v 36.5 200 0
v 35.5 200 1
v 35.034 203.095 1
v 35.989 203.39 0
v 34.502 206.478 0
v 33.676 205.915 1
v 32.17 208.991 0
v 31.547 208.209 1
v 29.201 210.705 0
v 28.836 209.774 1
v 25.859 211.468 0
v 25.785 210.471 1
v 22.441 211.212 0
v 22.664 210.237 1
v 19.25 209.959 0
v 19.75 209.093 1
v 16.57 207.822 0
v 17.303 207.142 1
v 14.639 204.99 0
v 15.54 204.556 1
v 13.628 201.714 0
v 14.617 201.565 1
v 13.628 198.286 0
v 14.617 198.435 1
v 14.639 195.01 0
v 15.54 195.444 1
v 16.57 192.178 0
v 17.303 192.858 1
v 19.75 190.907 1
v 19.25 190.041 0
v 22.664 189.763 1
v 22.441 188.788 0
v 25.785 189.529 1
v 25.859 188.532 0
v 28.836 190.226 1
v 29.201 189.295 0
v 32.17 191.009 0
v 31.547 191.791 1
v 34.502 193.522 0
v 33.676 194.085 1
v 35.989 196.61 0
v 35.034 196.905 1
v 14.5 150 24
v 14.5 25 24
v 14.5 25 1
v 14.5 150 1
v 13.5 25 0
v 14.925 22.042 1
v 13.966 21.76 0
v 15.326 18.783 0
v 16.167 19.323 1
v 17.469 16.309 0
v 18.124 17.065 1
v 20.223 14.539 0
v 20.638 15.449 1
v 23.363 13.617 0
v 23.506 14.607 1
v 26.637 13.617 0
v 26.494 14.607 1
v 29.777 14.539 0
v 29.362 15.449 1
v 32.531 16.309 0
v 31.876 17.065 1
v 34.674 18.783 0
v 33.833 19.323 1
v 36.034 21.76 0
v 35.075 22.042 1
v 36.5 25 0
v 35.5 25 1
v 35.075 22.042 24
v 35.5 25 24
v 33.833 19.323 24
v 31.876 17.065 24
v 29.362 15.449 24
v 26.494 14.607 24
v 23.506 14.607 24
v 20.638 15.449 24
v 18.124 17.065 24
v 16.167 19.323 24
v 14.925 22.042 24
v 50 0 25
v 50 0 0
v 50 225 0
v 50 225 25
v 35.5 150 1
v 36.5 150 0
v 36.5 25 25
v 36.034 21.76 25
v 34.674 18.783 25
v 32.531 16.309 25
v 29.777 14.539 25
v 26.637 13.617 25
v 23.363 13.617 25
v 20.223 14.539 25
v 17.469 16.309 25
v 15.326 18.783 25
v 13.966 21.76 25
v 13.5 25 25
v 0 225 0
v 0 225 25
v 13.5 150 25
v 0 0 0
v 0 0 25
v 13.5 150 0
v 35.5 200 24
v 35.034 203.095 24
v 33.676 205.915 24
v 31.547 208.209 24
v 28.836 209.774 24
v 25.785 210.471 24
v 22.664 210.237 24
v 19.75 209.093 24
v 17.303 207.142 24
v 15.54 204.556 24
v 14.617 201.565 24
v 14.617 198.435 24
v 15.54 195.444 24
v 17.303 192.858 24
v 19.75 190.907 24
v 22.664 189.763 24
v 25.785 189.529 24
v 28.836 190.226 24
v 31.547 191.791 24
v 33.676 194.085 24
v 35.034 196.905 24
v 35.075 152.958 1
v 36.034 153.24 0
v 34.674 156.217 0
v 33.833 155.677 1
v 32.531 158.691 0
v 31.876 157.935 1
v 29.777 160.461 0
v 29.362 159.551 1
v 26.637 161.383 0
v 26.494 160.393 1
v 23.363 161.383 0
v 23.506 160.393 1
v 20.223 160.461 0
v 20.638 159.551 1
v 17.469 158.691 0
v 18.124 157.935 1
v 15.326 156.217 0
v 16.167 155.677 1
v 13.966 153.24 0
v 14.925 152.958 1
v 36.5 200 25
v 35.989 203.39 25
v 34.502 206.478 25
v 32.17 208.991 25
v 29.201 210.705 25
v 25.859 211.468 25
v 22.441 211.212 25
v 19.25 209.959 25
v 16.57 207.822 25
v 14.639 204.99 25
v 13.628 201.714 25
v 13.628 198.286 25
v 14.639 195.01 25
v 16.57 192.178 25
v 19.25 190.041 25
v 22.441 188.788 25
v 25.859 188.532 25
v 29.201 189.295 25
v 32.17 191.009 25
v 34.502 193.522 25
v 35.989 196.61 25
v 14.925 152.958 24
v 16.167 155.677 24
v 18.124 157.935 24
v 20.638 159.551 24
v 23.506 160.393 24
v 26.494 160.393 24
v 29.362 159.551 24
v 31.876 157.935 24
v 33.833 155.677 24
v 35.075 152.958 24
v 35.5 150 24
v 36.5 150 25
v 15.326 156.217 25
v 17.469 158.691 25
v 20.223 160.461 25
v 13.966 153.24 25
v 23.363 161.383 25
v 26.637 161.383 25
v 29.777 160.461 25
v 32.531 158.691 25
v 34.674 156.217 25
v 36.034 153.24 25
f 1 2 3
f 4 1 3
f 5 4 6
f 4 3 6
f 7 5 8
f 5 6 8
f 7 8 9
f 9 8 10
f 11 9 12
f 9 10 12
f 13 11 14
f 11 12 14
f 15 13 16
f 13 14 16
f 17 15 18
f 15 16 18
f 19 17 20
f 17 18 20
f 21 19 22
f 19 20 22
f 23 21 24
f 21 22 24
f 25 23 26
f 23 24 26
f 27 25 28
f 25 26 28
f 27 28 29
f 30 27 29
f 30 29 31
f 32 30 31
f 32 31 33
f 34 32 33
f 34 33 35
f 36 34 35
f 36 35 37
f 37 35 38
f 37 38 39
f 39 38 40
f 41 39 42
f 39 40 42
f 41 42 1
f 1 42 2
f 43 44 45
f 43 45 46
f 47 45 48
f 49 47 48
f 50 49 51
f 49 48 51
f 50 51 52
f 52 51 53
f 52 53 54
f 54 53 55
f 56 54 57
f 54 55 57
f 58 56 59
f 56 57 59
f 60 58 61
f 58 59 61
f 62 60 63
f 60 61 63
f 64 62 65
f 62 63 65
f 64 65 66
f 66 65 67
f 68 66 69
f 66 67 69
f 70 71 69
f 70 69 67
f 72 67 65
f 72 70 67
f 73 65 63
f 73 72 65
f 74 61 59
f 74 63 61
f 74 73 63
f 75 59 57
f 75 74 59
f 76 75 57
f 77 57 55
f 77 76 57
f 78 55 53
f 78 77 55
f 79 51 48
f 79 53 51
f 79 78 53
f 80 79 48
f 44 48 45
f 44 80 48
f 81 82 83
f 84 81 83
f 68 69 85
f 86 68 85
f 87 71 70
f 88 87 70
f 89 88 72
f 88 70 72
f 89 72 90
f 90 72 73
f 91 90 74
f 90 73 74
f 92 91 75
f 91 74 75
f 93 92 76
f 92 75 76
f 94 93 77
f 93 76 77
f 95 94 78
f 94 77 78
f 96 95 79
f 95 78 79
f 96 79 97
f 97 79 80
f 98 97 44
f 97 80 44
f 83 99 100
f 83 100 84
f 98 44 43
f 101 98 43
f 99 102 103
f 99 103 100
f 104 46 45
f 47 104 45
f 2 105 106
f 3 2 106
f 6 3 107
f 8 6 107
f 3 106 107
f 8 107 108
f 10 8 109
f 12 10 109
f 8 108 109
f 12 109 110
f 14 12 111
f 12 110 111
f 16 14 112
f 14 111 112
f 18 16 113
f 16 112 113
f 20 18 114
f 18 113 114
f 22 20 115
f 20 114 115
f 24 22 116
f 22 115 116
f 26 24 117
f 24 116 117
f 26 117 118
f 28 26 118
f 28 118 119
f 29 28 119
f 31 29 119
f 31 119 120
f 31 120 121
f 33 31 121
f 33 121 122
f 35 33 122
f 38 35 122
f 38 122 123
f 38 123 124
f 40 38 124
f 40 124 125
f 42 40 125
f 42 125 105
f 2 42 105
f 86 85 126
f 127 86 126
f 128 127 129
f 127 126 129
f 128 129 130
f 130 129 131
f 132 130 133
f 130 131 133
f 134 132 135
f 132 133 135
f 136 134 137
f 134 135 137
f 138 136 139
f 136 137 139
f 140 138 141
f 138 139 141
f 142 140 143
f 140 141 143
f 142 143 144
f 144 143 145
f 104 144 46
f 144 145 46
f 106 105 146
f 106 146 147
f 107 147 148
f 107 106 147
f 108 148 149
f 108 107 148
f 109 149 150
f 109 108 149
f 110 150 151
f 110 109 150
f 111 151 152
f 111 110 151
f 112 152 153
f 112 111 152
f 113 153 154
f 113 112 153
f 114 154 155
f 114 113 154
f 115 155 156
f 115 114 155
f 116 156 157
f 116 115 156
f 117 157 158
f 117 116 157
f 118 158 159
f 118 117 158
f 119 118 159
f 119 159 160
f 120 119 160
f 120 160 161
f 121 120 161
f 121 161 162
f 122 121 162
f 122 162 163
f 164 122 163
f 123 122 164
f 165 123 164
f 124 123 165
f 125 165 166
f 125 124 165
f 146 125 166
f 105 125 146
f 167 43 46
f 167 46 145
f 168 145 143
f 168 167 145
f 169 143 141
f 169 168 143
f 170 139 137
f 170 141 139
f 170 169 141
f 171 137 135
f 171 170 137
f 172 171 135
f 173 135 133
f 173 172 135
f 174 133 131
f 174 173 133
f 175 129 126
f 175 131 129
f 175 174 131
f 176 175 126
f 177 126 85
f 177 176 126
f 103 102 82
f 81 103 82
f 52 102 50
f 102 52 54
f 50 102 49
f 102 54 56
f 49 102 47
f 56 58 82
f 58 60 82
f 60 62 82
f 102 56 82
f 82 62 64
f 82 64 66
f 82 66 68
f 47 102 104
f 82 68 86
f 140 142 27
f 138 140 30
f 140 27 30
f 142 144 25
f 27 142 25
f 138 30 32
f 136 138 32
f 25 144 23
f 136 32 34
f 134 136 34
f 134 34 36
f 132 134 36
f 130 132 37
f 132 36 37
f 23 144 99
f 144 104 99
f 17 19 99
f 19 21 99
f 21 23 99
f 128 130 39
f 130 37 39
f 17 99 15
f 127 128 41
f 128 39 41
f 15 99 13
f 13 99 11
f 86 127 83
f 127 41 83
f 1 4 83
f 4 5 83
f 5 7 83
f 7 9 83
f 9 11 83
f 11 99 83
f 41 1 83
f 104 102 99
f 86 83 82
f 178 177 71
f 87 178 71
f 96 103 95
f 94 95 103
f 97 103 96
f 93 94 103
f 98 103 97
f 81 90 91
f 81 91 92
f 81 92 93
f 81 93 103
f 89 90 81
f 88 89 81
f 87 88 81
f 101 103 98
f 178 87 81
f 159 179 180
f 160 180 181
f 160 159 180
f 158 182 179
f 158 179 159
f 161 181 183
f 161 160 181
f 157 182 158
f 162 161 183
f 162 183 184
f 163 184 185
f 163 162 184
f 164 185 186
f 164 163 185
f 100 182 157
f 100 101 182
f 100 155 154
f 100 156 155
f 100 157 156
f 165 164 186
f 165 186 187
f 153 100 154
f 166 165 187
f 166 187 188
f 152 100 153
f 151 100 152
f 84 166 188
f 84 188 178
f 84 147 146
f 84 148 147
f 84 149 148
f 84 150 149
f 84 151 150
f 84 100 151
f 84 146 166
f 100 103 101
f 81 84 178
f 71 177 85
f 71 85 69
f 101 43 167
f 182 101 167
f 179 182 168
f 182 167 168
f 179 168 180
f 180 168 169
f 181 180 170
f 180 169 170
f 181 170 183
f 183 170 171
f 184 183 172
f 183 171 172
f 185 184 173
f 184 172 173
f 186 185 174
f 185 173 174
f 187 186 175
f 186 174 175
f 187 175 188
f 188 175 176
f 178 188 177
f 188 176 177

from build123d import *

# Parameters (mm, degrees)
SKETCH_1_W          = 50
SKETCH_1_H          = 225
EXTRUDE_1_DEPTH     = 25
SKETCH_2_R          = 10.5
CUT_EXTRUDE_1_DEPTH = 26
CHAMFER_1_SIZE      = 1


with BuildPart() as part:
    # Эскиз1 → Бобышка-Вытянуть1 (new body)
    with BuildSketch(Plane.XY):
        with Locations((25, 112.5)):
            Rectangle(SKETCH_1_W, SKETCH_1_H)
    extrude(amount=EXTRUDE_1_DEPTH)

    # Эскиз2 → Вырез-Вытянуть1 (cut, through all)
    with BuildSketch(Plane.XY.offset(25)):
        with Locations((25, 200)):
            Circle(SKETCH_2_R)
        with BuildLine():
            Line((14.5, 25), (14.5, 150))
            ThreePointArc((14.5, 150), (25, 160.5), (35.5, 150))
            Line((35.5, 150), (35.5, 25))
            ThreePointArc((35.5, 25), (25, 14.5), (14.5, 25))
        make_face()
    extrude(amount=-CUT_EXTRUDE_1_DEPTH, mode=Mode.SUBTRACT)

    # Фаска1
    chamfer_1_edges = [part.edges().sort_by_distance(p)[0] for p in [
        (25, 14.5, 0),
        (14.5, 87.5, 0),
        (25, 160.5, 0),
        (35.5, 87.5, 0),
        (25, 14.5, 25),
        (35.5, 87.5, 25),
        (25, 160.5, 25),
        (14.5, 87.5, 25),
        (14.5, 200, 0),
        (14.5, 200, 25),
    ]]
    chamfer(chamfer_1_edges, length=CHAMFER_1_SIZE)


solid = part.part
